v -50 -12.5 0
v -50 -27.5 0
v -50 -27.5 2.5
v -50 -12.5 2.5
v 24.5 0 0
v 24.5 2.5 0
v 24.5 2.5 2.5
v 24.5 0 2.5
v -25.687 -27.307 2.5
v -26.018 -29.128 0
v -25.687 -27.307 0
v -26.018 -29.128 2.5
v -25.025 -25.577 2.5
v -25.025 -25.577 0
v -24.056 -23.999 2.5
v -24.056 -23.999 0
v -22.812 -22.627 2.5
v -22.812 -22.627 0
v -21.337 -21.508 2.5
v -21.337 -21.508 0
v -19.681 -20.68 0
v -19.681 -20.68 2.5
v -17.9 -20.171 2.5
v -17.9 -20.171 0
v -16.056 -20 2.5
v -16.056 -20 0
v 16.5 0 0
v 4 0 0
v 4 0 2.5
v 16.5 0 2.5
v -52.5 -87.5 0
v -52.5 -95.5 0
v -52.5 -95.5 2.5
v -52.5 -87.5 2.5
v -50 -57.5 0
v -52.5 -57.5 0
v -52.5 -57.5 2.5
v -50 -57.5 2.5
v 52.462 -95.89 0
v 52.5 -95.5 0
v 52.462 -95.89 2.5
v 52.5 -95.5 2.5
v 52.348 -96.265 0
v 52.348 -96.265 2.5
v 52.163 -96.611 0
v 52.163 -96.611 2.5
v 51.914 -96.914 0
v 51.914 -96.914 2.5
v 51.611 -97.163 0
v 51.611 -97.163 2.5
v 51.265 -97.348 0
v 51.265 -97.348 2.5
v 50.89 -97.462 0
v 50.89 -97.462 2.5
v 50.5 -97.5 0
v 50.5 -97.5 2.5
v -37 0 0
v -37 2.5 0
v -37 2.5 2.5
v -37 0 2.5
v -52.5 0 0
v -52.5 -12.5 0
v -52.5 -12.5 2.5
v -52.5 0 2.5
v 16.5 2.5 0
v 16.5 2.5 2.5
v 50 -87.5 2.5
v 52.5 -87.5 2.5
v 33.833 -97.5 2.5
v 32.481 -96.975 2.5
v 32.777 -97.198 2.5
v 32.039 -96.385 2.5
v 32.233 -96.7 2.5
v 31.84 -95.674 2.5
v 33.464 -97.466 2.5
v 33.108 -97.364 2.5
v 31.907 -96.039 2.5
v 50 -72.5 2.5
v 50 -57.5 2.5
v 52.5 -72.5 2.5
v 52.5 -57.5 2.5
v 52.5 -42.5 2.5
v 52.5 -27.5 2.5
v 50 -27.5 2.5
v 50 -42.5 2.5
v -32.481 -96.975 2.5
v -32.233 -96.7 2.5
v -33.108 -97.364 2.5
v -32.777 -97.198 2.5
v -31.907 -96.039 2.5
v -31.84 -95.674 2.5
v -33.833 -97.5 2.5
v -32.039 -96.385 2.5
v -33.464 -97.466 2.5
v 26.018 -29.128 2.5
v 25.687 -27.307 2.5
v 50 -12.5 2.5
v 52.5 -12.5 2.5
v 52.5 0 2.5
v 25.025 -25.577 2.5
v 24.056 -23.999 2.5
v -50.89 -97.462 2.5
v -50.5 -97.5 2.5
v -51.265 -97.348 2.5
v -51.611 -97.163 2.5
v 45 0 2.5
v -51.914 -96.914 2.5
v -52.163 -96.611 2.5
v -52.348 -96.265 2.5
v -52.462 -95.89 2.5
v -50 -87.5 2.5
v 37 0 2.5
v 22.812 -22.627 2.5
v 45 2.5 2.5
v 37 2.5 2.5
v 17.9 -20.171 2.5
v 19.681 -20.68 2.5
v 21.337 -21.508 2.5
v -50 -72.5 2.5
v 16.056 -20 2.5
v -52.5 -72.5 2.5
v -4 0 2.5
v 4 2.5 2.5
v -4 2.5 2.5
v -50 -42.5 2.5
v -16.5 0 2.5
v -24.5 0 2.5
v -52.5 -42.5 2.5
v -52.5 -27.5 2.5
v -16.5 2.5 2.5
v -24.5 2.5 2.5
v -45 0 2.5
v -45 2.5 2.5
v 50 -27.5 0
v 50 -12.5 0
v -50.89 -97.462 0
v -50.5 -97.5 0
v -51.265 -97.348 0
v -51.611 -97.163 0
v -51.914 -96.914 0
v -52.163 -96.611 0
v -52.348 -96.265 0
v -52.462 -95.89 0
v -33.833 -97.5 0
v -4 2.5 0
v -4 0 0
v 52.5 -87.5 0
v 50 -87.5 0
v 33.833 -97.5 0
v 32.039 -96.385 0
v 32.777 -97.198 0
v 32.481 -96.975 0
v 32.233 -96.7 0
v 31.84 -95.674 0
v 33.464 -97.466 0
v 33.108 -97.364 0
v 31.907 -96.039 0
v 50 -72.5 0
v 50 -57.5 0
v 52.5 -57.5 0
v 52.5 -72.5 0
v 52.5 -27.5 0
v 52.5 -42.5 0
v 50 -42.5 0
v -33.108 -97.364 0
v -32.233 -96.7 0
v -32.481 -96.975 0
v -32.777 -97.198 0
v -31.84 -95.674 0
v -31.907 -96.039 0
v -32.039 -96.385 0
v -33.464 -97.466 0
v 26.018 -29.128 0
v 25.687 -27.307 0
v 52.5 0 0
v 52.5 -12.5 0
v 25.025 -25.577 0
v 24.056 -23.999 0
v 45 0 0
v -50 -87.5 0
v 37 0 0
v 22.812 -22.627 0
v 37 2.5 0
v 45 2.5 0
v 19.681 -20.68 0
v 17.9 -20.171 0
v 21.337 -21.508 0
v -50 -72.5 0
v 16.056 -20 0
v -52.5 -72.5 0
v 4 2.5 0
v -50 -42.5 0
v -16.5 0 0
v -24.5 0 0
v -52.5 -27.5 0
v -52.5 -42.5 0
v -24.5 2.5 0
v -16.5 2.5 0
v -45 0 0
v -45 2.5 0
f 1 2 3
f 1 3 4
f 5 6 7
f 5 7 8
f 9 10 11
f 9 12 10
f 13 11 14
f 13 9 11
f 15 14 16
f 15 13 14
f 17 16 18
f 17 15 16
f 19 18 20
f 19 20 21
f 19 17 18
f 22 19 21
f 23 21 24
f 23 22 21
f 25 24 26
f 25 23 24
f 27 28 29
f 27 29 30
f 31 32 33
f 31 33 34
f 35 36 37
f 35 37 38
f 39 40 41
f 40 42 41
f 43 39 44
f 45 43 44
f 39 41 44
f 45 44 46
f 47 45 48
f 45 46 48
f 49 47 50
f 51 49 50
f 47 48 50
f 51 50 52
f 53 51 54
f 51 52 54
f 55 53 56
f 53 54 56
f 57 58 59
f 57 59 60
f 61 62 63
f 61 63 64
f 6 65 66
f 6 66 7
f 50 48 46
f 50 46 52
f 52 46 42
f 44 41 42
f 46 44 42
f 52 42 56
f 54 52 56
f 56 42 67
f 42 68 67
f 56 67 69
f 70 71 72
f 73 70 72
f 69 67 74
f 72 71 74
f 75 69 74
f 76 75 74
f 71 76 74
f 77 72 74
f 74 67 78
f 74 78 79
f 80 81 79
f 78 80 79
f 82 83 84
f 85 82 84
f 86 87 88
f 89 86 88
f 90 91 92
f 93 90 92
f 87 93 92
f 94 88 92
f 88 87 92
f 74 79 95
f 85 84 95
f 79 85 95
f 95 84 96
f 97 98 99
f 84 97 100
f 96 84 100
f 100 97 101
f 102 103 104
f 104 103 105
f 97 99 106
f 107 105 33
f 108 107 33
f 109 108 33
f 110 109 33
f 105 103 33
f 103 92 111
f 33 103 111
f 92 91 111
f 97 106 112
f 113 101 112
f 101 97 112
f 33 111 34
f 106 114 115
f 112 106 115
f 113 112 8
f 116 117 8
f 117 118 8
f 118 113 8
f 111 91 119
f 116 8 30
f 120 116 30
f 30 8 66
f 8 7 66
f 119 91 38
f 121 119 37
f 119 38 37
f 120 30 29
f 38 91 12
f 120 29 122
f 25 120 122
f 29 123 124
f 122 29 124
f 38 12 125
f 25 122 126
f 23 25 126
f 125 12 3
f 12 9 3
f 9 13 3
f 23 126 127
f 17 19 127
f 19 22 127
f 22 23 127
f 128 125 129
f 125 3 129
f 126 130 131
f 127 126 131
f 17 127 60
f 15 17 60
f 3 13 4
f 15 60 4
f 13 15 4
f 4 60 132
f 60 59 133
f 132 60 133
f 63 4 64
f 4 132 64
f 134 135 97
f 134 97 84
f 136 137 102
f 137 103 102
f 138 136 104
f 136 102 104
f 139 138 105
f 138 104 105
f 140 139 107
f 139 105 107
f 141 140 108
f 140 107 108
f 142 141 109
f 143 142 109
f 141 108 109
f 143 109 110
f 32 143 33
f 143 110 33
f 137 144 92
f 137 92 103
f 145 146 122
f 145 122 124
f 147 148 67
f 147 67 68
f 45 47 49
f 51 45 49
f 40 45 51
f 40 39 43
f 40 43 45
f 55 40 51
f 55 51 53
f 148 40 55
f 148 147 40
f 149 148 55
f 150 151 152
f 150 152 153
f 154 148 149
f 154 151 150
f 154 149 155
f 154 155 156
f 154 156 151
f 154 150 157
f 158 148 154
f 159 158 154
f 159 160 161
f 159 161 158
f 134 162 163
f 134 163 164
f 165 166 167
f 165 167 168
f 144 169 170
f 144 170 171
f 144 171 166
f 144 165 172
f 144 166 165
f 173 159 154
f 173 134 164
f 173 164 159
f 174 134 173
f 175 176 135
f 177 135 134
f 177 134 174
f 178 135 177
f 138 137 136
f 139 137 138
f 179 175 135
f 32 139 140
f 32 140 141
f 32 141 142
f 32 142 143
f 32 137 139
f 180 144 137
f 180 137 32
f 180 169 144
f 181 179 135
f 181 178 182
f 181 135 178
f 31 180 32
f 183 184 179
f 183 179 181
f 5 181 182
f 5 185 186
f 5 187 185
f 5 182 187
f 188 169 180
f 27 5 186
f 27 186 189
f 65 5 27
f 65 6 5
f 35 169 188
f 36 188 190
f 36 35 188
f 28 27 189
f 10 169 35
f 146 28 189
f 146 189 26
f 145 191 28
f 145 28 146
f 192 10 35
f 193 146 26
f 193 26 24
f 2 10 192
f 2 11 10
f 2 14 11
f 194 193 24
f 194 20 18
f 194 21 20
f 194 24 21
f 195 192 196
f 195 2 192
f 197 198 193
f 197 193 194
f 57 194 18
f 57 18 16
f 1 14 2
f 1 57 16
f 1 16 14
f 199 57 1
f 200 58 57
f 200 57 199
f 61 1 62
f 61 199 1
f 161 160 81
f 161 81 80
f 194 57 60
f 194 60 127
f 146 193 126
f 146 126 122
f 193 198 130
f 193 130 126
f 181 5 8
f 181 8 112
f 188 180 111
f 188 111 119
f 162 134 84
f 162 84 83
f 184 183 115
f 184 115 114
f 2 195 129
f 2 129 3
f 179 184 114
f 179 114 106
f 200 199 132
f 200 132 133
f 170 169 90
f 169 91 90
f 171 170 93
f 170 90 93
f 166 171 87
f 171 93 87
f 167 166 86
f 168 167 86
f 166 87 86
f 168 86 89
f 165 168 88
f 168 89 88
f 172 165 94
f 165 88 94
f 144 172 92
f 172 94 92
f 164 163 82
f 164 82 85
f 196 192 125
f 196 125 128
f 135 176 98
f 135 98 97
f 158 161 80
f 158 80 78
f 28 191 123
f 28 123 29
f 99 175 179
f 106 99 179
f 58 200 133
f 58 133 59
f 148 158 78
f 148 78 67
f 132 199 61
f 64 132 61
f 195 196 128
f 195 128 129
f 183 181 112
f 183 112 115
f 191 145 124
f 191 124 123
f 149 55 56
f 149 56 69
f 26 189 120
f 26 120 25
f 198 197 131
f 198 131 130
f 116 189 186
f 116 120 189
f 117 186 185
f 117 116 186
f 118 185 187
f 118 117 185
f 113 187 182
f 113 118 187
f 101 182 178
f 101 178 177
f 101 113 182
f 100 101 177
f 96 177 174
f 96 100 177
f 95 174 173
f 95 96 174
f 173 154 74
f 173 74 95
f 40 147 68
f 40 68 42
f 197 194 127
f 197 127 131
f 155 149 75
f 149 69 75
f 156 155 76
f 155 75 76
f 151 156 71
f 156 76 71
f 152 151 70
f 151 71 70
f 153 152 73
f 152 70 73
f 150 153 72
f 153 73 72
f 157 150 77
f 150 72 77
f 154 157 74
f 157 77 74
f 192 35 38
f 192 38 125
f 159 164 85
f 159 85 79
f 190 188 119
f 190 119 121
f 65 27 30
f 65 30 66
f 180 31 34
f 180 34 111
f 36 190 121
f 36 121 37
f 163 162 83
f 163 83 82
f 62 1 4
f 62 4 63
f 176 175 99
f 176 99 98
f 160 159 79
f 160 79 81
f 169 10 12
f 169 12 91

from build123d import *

# Parameters (mm, degrees)
BOSS_EXTRUDE1_DEPTH = 2.5
FILLET1_R           = 2
FILLET2_R           = 10


with BuildPart() as part:
    # Sketch1 → Boss-Extrude1 (new body)
    with BuildSketch(Plane.XY):
        Polygon((-25.219628577, -20), (-32, -97.5), (-52.5, -97.5), (-52.5, -87.5), (-50, -87.5), (-50, -72.5), (-52.5, -72.5), (-52.5, -57.5), (-50, -57.5), (-50, -42.5), (-52.5, -42.5), (-52.5, -27.5), (-50, -27.5), (-50, -12.5), (-52.5, -12.5), (-52.5, 0), (-50, 0), (-45, 0), (-45, 2.5), (-37, 2.5), (-37, 0), (-24.5, 0), (-24.5, 2.5), (-16.5, 2.5), (-16.5, 0), (-4, 0), (-4, 2.5), (4, 2.5), (4, 0), (16.5, 0), (16.5, 2.5), (24.5, 2.5), (24.5, 0), (37, 0), (37, 2.5), (45, 2.5), (45, 0), (50, 0), (52.5, 0), (52.5, -12.5), (50, -12.5), (50, -27.5), (52.5, -27.5), (52.5, -42.5), (50, -42.5), (50, -57.5), (52.5, -57.5), (52.5, -72.5), (50, -72.5), (50, -87.5), (52.5, -87.5), (52.5, -97.5), (32, -97.5), (25.219628577, -20), align=None)
    extrude(amount=BOSS_EXTRUDE1_DEPTH)

    # Fillet1
    fillet1_edges = [part.edges().sort_by_distance(p)[0] for p in [
        (52.5, -97.5, 1.25),
        (32, -97.5, 1.25),
        (-32, -97.5, 1.25),
        (-52.5, -97.5, 1.25),
    ]]
    fillet(fillet1_edges, radius=FILLET1_R)

    # Fillet2
    fillet2_edges = [part.edges().sort_by_distance(p)[0] for p in [
        (25.219628577, -20, 1.25),
        (-25.219628577, -20, 1.25),
    ]]
    fillet(fillet2_edges, radius=FILLET2_R)


solid = part.part
